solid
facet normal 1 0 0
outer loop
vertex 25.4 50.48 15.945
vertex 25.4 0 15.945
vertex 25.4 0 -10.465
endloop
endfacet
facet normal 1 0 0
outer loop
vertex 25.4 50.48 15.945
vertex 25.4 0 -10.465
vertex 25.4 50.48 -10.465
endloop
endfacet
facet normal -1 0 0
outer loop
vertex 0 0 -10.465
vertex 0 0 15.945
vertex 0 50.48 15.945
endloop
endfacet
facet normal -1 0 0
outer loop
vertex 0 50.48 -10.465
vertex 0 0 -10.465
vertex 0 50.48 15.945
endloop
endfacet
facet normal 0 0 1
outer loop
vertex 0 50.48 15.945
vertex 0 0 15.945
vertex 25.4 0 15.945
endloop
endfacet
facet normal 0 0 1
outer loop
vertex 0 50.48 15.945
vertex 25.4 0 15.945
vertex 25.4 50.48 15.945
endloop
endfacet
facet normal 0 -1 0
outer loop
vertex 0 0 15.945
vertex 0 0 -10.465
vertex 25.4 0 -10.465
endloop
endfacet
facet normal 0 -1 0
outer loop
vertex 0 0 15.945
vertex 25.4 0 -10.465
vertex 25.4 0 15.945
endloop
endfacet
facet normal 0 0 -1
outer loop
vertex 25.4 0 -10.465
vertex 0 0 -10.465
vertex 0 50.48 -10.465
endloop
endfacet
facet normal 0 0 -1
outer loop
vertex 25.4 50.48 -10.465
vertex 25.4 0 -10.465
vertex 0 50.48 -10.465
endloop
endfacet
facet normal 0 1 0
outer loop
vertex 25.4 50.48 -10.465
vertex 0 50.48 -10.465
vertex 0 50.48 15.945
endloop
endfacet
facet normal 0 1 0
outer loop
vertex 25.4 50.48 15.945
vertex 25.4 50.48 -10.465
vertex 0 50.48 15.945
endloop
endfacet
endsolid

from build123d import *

# Parameters (mm, degrees)
F1_DEPTH = 127
F3_W     = 50.480350852
F3_H     = 26.4108004048
F3_R     = 4.0876975992
F4_DEPTH = 25.4


with BuildPart() as f1:
    # F0 (on Front) → F1 (new body)
    with BuildSketch(Plane.XZ):
        Polygon((-38.6266857386, -9.9715394899), (-20.369682461, -28.674185276), (0, -28.674185276), (0, 22.6510167122), (-20.369682461, 22.6510167122), (-38.6266857386, 8.4274075925), align=None)
    extrude(amount=-F1_DEPTH)


with BuildPart() as f4:
    # F3 (on Right) → F4 (new body)
    with BuildSketch(Plane.YZ):
        with Locations((25.240175426, 2.739997115)):
            Rectangle(F3_W, F3_H)
        with Locations((16.2280499935, 7.0170103572)):
            Circle(F3_R, mode=Mode.SUBTRACT)
        with Locations((16.2280499935, 7.0170103572)):
            Circle(F3_R)
    extrude(amount=F4_DEPTH)


solid = f4.part
